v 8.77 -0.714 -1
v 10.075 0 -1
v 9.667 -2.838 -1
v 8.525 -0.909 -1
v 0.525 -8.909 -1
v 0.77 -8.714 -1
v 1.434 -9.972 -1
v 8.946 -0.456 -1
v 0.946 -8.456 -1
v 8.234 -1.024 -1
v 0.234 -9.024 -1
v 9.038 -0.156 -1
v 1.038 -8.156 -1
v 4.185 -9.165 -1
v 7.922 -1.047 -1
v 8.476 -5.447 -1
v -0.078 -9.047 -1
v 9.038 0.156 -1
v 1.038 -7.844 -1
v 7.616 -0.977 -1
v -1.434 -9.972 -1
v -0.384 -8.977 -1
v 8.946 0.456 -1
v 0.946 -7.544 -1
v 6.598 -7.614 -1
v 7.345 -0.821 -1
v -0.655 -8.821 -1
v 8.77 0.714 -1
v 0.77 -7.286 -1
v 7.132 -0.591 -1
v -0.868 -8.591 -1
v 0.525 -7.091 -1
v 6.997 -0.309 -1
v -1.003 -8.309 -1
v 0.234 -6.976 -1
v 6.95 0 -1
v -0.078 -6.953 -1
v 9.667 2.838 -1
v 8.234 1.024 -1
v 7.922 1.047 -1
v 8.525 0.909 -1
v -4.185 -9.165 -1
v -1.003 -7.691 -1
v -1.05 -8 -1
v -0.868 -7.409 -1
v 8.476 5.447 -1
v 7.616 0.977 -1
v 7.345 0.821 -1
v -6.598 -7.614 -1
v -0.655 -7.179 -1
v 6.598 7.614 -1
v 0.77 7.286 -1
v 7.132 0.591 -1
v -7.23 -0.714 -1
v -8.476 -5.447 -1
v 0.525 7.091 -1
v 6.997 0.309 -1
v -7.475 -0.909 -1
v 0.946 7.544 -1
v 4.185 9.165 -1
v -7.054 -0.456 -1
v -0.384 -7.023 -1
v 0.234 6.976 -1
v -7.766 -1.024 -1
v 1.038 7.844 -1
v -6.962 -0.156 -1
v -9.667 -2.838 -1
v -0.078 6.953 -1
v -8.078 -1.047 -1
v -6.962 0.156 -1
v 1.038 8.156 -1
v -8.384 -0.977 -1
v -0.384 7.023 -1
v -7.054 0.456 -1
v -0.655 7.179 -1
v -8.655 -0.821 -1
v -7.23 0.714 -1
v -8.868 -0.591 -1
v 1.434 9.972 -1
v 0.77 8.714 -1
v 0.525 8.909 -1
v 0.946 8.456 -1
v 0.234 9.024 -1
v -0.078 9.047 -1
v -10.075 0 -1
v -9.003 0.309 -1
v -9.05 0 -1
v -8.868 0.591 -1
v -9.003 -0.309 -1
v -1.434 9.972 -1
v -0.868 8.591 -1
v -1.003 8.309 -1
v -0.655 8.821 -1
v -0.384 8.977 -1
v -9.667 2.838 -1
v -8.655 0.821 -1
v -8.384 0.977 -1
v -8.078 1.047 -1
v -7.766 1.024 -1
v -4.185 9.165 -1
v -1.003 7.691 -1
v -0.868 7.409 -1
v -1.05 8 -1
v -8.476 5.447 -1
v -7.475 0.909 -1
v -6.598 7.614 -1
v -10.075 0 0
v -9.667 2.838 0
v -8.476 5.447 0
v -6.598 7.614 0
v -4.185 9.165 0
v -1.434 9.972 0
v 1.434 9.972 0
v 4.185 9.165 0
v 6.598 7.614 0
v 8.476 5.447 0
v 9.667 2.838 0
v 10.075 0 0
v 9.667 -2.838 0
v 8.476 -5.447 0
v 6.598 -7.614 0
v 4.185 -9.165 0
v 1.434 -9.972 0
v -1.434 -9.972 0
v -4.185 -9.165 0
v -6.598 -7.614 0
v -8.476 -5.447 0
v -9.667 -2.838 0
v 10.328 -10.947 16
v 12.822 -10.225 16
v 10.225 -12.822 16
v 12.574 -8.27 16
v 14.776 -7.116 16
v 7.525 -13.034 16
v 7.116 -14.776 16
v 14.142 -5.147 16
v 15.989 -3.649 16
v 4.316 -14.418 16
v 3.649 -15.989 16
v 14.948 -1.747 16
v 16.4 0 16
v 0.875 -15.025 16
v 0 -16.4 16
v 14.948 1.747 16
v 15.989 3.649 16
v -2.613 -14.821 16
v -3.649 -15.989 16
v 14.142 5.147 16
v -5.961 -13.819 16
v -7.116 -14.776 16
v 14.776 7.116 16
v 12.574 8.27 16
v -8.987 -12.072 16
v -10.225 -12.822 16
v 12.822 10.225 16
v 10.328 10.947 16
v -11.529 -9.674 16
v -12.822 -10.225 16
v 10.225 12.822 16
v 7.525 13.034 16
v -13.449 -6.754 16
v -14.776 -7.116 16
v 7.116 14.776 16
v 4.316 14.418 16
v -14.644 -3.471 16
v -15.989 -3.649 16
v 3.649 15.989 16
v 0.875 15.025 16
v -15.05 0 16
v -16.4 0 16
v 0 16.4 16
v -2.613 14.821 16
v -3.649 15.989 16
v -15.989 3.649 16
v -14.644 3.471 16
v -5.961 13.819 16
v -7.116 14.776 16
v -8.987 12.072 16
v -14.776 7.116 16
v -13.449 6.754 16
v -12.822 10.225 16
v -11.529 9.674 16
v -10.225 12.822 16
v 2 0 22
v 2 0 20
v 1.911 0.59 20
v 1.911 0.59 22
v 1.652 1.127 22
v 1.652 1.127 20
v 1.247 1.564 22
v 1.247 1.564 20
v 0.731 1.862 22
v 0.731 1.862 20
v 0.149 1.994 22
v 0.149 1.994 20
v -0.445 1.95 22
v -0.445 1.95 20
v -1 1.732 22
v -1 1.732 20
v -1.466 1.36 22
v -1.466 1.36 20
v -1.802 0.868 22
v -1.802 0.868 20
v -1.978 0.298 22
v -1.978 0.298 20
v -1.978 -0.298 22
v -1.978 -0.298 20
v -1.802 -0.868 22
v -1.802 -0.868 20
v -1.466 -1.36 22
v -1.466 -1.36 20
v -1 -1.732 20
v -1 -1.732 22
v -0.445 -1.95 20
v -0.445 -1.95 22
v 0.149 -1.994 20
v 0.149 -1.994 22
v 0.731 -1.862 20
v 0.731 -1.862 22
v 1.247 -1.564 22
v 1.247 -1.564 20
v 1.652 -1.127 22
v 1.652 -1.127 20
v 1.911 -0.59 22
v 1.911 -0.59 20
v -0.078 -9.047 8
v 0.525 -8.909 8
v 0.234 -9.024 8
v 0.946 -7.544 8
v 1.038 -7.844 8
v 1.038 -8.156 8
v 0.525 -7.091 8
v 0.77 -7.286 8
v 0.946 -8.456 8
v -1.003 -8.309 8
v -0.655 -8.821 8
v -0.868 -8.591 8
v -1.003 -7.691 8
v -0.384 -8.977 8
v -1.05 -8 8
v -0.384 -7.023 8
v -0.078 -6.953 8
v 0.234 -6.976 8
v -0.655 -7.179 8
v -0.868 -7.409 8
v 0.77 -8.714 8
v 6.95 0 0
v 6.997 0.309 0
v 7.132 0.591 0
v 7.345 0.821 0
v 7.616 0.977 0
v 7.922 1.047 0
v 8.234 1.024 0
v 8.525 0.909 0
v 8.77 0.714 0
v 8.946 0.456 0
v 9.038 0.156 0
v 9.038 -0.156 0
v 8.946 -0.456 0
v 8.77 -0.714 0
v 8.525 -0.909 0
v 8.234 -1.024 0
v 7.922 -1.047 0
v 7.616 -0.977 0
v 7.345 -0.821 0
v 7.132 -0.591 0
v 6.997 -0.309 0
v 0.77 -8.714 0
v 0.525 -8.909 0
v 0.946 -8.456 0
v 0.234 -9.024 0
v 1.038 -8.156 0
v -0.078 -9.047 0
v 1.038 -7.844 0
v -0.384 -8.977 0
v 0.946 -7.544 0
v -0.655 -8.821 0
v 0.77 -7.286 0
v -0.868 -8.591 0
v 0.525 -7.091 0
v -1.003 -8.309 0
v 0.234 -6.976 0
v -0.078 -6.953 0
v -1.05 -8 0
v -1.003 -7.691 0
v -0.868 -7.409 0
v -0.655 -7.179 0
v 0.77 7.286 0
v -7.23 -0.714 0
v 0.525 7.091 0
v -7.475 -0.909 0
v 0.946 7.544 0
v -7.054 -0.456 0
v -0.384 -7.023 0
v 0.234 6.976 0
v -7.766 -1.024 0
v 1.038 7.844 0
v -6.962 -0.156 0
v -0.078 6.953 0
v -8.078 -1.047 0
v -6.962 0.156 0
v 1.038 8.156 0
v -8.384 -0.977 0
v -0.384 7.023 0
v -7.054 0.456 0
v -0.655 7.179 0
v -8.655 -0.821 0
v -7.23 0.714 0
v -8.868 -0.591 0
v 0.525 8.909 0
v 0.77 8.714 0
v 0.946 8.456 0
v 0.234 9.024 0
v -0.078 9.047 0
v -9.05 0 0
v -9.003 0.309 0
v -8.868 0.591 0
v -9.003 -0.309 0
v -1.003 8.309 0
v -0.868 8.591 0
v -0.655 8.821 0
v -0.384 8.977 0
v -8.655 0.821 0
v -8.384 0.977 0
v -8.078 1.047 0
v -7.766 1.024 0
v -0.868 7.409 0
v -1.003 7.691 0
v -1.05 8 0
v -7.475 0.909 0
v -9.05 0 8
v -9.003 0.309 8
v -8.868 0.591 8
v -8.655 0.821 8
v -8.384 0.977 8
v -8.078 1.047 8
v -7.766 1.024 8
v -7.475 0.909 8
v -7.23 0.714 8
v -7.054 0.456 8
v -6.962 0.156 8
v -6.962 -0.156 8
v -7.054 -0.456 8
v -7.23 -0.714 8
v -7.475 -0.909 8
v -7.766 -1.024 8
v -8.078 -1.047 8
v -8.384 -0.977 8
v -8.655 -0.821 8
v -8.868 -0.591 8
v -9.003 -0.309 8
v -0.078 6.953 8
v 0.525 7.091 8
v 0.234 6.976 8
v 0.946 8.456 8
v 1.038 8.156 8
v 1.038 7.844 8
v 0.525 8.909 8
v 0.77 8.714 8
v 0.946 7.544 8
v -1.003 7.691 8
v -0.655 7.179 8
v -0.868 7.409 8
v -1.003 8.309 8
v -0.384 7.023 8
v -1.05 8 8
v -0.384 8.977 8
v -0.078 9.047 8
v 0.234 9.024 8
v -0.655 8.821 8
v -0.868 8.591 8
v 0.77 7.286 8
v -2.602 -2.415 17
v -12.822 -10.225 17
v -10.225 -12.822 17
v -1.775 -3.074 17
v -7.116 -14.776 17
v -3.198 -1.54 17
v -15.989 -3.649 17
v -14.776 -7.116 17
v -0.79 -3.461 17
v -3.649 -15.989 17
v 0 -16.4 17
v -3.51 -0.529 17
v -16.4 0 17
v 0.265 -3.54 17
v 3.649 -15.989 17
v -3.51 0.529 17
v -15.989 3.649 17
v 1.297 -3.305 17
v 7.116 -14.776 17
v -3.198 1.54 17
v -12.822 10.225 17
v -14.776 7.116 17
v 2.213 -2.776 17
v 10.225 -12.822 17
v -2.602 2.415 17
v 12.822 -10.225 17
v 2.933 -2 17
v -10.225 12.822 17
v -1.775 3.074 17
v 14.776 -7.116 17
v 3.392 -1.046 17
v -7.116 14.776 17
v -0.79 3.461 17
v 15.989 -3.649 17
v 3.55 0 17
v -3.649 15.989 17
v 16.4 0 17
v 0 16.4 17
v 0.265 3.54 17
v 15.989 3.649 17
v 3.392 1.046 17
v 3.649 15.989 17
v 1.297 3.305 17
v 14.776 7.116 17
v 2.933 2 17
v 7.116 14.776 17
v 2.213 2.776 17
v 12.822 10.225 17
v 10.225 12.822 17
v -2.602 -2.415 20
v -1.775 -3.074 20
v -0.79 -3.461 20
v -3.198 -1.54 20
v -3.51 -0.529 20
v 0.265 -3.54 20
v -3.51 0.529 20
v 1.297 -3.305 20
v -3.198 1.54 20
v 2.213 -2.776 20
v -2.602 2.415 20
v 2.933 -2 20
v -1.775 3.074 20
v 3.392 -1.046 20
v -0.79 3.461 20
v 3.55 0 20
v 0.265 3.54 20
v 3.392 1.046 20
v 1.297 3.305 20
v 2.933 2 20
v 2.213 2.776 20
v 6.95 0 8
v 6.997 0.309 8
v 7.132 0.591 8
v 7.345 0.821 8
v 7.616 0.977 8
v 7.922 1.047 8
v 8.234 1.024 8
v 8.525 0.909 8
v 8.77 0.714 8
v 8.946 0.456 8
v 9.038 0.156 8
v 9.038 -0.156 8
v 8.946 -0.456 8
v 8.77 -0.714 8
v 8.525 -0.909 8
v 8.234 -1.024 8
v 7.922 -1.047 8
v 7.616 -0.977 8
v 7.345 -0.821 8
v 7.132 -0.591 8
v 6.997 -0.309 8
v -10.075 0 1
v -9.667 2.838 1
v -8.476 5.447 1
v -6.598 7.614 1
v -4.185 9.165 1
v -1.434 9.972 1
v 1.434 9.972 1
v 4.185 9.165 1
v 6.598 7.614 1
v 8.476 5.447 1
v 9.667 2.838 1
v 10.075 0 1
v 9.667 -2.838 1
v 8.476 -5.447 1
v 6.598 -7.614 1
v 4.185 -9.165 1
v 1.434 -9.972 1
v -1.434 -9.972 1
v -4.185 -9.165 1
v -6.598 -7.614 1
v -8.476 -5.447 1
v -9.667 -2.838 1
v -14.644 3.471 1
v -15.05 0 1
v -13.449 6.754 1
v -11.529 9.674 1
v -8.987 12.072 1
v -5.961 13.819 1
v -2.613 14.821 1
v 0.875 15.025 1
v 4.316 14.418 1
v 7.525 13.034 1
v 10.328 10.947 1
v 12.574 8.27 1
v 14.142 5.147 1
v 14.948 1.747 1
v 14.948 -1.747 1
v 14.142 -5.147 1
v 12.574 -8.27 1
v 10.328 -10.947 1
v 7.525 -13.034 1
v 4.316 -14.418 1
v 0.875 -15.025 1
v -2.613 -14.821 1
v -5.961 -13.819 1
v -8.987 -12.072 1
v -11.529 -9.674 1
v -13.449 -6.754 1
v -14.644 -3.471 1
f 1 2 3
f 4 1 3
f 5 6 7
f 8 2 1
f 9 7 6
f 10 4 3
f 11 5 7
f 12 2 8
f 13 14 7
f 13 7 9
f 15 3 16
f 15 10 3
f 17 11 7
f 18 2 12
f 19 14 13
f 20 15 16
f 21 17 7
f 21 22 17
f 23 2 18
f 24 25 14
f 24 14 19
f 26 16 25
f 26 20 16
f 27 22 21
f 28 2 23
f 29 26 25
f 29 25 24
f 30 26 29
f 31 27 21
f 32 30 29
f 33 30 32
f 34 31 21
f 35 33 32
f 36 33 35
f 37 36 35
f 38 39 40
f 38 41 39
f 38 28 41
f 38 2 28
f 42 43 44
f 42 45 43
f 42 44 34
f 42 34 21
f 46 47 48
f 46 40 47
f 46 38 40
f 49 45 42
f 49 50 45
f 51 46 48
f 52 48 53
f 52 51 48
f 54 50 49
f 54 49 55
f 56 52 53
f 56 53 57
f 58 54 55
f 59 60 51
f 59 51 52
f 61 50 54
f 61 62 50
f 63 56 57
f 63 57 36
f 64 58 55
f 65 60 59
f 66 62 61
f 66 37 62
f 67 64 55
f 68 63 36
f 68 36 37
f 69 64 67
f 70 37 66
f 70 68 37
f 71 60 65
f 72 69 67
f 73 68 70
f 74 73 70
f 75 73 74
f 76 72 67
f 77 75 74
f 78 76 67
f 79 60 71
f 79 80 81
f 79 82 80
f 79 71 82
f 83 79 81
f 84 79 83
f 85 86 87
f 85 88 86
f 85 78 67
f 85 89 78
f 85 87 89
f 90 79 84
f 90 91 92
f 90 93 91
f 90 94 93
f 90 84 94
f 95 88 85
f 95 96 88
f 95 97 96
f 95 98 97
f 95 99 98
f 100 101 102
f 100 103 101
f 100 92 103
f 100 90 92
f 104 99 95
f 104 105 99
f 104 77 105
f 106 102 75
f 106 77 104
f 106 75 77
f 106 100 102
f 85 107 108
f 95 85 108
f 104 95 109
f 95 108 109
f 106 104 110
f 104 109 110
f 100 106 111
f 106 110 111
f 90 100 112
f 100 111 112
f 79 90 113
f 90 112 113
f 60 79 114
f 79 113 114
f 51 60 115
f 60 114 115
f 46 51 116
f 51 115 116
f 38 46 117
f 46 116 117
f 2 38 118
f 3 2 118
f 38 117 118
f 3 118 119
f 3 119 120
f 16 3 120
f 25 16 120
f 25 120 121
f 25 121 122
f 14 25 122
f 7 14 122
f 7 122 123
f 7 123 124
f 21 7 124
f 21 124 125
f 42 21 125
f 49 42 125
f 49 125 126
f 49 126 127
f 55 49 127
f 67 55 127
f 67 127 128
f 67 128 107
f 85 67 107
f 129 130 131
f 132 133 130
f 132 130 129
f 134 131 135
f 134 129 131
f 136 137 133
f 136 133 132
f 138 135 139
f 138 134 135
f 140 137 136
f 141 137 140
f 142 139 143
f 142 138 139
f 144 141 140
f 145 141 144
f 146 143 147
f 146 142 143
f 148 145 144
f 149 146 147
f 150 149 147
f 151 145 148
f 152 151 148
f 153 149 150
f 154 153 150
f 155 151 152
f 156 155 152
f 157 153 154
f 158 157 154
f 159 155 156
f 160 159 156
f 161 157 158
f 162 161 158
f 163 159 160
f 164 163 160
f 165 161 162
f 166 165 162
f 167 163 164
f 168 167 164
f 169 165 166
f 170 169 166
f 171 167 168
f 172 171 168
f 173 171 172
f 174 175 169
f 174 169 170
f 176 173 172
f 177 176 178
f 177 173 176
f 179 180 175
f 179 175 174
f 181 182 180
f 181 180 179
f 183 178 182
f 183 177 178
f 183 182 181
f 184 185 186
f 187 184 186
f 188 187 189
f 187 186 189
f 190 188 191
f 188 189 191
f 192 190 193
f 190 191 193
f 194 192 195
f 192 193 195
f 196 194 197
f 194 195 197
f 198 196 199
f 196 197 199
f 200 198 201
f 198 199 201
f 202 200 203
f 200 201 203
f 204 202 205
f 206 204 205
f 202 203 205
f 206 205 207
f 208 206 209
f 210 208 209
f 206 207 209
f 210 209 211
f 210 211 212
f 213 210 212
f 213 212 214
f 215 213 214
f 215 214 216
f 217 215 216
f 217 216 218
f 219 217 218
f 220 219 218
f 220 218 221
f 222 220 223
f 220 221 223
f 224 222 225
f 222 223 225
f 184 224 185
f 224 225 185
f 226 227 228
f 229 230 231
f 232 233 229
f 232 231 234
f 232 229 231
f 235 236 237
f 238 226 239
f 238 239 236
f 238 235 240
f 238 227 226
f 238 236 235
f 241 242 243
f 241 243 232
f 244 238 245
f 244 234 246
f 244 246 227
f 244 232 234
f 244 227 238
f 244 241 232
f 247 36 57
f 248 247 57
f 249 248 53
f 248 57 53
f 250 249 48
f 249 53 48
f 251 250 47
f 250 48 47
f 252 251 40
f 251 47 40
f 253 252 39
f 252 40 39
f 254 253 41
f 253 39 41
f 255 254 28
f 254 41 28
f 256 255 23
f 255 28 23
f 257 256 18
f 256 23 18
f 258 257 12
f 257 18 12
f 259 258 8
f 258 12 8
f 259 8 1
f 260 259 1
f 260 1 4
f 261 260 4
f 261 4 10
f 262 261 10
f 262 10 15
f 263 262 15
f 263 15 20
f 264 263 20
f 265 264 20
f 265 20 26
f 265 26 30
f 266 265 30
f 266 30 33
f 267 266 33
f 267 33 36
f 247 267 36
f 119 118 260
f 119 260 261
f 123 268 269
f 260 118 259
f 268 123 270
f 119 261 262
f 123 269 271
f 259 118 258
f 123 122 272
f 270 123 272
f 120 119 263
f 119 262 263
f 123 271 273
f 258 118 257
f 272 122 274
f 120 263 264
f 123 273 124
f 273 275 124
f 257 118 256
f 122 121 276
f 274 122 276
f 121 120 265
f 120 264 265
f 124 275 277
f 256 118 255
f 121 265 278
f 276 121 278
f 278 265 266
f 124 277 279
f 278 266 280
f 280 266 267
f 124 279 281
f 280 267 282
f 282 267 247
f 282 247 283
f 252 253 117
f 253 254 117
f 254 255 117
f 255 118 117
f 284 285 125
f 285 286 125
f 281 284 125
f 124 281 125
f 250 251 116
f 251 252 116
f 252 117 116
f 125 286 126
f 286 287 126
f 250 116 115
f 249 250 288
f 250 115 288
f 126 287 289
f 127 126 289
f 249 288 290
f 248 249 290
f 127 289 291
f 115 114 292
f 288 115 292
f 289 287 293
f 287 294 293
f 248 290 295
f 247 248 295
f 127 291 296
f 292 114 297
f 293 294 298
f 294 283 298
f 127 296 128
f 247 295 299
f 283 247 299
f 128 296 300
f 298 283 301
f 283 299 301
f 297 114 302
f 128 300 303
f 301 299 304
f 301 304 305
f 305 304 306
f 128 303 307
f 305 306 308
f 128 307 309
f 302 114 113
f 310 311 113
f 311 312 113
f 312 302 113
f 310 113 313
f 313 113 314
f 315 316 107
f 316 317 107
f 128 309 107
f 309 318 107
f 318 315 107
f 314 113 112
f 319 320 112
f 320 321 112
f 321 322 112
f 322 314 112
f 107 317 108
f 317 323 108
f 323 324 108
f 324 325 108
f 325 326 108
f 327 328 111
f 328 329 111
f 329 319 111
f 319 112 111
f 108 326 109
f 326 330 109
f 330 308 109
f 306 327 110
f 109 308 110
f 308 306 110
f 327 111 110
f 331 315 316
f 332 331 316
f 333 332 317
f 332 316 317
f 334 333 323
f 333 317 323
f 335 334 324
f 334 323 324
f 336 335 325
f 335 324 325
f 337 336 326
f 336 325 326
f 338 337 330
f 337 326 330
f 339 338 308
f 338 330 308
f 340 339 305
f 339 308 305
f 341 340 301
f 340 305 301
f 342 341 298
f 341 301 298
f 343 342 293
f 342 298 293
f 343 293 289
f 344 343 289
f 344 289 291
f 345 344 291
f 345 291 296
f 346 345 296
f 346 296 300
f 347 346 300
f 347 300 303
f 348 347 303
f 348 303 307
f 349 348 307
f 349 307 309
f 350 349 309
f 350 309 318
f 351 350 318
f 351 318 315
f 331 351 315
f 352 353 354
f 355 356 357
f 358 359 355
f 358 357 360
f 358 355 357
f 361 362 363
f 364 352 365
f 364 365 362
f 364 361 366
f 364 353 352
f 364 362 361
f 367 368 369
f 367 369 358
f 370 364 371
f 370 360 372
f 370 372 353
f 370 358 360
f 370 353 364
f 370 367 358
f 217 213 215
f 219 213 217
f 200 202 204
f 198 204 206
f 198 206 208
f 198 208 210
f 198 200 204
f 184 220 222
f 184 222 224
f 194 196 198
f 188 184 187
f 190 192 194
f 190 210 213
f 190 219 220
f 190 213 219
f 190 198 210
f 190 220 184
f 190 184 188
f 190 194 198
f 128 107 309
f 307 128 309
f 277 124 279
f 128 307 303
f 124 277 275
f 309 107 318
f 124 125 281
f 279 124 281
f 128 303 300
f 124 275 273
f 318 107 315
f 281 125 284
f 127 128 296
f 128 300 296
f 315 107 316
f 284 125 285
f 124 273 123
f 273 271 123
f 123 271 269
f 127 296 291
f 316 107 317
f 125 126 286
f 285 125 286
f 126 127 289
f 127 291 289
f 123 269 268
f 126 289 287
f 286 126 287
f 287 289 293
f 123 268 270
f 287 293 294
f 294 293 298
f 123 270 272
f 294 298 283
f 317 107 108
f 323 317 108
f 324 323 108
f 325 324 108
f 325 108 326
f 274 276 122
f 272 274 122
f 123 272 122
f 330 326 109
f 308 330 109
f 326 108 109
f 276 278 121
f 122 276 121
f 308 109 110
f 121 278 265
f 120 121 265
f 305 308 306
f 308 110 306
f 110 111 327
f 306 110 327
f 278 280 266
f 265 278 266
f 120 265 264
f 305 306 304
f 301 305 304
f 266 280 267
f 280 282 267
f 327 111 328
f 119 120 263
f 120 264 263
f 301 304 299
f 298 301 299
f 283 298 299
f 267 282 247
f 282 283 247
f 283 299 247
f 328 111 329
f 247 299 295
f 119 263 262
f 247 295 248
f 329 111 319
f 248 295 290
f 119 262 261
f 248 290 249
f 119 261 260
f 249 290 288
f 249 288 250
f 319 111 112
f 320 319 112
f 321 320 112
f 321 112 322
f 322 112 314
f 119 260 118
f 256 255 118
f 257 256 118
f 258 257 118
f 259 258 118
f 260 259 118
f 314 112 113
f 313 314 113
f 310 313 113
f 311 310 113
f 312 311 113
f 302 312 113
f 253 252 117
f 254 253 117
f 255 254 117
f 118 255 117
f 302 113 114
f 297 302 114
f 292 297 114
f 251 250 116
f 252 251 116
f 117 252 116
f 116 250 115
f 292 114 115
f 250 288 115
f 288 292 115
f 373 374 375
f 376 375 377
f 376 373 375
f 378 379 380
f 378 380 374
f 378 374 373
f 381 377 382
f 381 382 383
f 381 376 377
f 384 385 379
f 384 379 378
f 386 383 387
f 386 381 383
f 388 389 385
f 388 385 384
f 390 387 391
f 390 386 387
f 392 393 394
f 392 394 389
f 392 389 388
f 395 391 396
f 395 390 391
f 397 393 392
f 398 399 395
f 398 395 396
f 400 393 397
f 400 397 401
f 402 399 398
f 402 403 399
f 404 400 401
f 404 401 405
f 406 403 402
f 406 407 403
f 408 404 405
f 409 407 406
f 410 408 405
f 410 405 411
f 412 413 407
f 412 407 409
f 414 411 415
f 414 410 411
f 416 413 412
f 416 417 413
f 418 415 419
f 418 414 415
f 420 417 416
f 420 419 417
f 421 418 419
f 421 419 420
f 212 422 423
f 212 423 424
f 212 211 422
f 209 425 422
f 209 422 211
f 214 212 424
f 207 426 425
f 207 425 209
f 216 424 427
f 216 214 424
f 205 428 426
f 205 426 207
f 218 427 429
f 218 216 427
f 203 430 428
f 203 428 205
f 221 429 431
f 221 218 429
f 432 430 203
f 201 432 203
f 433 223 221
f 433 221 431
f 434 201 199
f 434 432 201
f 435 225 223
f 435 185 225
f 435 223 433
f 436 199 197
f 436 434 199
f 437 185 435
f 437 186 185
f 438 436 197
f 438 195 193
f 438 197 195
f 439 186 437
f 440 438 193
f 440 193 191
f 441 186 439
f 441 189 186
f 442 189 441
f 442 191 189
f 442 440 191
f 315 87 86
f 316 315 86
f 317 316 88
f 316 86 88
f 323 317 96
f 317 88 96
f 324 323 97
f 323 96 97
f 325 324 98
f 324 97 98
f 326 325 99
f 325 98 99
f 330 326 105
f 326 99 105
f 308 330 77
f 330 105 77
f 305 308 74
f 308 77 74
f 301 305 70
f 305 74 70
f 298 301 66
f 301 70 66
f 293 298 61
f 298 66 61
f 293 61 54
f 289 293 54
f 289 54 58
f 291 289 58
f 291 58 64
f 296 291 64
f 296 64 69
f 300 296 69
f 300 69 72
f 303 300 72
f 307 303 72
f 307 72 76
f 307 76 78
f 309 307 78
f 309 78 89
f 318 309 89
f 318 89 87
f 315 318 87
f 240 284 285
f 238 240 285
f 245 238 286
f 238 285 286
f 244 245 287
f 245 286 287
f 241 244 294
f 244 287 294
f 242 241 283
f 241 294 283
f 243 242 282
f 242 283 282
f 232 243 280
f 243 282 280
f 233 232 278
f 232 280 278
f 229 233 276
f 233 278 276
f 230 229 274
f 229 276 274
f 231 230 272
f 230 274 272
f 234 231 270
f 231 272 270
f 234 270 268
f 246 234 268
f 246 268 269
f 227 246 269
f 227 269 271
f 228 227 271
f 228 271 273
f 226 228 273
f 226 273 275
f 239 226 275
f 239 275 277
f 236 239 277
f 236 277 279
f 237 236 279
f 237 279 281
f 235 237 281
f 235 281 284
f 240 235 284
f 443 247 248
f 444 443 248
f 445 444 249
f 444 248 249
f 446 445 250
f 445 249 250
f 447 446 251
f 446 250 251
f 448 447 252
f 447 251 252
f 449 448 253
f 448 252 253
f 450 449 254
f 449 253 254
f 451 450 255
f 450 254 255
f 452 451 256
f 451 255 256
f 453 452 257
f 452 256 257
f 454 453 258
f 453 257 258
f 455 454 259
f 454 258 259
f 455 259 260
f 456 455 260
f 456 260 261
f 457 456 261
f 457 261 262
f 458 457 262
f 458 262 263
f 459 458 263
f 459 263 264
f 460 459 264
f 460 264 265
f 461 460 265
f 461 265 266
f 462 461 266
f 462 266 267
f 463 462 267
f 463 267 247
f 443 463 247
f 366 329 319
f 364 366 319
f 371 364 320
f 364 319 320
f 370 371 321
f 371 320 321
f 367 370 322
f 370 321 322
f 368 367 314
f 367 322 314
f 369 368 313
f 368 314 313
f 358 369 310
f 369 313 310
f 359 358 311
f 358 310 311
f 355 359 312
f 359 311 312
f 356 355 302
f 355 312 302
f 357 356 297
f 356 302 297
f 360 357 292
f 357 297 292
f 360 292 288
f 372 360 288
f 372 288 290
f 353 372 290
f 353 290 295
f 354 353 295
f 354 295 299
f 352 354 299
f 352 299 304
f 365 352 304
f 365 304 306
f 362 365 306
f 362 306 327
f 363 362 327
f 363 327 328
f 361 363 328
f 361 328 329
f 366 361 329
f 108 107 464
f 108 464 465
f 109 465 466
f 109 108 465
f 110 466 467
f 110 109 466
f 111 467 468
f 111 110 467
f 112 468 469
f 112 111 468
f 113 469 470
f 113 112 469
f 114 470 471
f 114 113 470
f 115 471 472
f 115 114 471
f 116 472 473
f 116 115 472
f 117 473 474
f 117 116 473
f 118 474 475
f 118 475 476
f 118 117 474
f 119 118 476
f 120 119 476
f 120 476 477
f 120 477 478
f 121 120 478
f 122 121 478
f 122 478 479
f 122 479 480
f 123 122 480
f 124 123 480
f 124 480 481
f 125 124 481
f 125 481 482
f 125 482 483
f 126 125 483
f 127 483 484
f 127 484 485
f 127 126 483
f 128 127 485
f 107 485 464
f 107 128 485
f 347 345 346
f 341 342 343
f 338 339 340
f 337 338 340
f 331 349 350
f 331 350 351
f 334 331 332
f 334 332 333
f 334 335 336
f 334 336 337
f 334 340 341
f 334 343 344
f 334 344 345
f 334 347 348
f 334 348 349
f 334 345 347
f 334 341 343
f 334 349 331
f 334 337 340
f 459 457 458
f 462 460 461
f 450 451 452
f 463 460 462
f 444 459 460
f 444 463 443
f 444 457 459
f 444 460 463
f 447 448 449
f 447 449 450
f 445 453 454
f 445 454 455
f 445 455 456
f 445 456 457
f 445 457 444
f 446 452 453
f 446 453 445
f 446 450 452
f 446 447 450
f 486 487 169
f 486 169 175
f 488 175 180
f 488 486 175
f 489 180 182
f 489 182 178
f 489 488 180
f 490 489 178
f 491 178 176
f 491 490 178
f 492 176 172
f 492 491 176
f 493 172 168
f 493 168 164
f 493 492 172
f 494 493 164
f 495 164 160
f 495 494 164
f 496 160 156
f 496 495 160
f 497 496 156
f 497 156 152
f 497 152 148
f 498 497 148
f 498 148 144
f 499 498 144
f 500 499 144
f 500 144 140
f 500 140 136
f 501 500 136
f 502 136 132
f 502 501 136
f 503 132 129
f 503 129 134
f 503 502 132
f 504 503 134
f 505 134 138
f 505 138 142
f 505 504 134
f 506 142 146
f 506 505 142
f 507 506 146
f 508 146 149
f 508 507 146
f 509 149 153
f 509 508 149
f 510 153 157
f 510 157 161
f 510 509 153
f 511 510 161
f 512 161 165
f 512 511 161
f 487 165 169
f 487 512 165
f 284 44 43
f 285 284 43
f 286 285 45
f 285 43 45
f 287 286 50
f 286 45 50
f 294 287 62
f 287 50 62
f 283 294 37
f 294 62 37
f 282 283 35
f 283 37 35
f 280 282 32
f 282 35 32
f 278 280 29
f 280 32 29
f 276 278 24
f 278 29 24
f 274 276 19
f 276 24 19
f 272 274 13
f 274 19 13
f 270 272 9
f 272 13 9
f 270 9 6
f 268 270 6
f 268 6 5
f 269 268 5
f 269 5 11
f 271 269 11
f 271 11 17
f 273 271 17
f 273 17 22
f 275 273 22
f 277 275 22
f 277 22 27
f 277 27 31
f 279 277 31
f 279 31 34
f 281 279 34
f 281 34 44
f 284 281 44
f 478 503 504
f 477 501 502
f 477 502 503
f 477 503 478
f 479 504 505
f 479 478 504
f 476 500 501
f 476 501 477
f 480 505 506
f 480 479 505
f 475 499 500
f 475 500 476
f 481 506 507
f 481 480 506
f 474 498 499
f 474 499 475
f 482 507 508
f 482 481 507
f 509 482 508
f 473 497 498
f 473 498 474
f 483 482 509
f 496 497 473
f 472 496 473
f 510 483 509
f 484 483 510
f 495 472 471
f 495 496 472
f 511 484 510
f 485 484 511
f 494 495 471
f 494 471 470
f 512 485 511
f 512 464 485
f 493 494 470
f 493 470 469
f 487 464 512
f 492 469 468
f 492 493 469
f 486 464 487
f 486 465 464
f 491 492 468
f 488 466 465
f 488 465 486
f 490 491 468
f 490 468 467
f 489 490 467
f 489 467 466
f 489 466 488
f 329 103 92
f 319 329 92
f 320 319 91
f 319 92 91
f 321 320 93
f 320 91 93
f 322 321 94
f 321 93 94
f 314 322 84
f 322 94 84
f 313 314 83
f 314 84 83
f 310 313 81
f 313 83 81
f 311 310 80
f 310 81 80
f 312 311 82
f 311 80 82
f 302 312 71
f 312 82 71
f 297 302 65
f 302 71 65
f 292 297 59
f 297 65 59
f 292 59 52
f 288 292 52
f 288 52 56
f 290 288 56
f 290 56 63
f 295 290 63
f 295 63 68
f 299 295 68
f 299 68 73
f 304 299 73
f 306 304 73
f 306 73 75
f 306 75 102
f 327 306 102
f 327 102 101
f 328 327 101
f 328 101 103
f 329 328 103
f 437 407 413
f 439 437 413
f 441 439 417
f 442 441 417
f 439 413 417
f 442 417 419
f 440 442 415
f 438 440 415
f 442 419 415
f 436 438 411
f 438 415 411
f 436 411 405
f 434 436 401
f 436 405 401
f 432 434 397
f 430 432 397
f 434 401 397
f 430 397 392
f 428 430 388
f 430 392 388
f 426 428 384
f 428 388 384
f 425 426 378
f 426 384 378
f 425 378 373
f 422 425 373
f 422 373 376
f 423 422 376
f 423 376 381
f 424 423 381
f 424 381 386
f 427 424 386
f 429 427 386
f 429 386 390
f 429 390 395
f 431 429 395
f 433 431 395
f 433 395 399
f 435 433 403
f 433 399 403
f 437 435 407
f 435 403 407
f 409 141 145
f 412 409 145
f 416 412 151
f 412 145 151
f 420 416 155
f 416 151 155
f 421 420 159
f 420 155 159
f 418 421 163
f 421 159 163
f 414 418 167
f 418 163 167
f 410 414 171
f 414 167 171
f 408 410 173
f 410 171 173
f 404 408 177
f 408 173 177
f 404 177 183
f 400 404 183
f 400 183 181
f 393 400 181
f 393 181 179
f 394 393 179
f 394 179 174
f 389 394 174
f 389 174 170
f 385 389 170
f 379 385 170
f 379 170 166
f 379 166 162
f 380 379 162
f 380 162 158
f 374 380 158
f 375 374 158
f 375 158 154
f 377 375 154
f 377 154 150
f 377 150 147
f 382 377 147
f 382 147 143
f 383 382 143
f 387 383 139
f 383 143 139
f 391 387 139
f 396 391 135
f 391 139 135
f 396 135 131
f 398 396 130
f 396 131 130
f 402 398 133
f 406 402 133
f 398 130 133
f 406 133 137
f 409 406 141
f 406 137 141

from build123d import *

# Parameters (mm, degrees)
SKETCH_1_R          = 16.4
EXTRUDE_1_DEPTH     = 17
SKETCH_2_R          = 3.55
EXTRUDE_2_DEPTH     = 3
SKETCH_3_R          = 10.075
EXTRUDE_3_DEPTH     = 2
SKETCH_7_R          = 1.05
CUT_EXTRUDE_3_DEPTH = 10
SKETCH3_R           = 16.4
SKETCH3_R_2         = 15.075
CUT_EXTRUDE1_DEPTH  = 16
SKETCH4_R           = 15.075
SKETCH4_R_2         = 10.075
CUT_EXTRUDE2_DEPTH  = 1
SKETCH5_R           = 10.075
CUT_EXTRUDE3_DEPTH  = 1
SKETCH6_R           = 2
BOSS_EXTRUDE1_DEPTH = 2
SKETCH7_R           = 15.075
SKETCH7_R_2         = 15.05
CUT_EXTRUDE4_DEPTH  = 15


with BuildPart() as part:
    # 草图1 → 凸台-拉伸1 (new body)
    with BuildSketch(Plane.XY):
        Circle(SKETCH_1_R)
    extrude(amount=EXTRUDE_1_DEPTH)

    # 草图2 → 凸台-拉伸2 (add)
    with BuildSketch(Plane.XY.offset(17)):
        Circle(SKETCH_2_R)
    extrude(amount=EXTRUDE_2_DEPTH)


with BuildPart() as body_2:
    # 草图3 → 凸台-拉伸3 (new body)
    with BuildSketch(Plane(origin=(0, 0, 0), x_dir=(-1, 0, 0), z_dir=(0, 0, -1))):
        Circle(SKETCH_3_R)
    extrude(amount=EXTRUDE_3_DEPTH)


with BuildPart() as cut_extrude_3_tool:
    # 草图7 → 切除-拉伸3 (new body)
    with BuildSketch(Plane(origin=(0, 0, -2), x_dir=(-1, 0, 0), z_dir=(0, 0, -1))):
        with Locations((0, 8)):
            Circle(SKETCH_7_R)
        with Locations((8, 0)):
            Circle(SKETCH_7_R)
        with Locations((0, -8)):
            Circle(SKETCH_7_R)
        with Locations((-8, 0)):
            Circle(SKETCH_7_R)
    extrude(amount=-CUT_EXTRUDE_3_DEPTH)


with BuildPart() as part_1:
    add(part.part)

    # 切除-拉伸3: cut by cut_extrude_3_tool
    add(cut_extrude_3_tool.part, mode=Mode.SUBTRACT)

    # Sketch3 → Cut-Extrude1 (cut)
    with BuildSketch(Plane(origin=(0, 0, 0), x_dir=(-1, 0, 0), z_dir=(0, 0, -1))):
        Circle(SKETCH3_R)
        Circle(SKETCH3_R_2, mode=Mode.SUBTRACT)
    extrude(amount=-CUT_EXTRUDE1_DEPTH, mode=Mode.SUBTRACT)

    # Sketch4 → Cut-Extrude2 (cut)
    with BuildSketch(Plane(origin=(0, 0, 0), x_dir=(-1, 0, 0), z_dir=(0, 0, -1))):
        Circle(SKETCH4_R)
        Circle(SKETCH4_R_2, mode=Mode.SUBTRACT)
    extrude(amount=-CUT_EXTRUDE2_DEPTH, mode=Mode.SUBTRACT)

    # Sketch6 → Boss-Extrude1 (add)
    with BuildSketch(Plane.XY.offset(20)):
        Circle(SKETCH6_R)
    extrude(amount=BOSS_EXTRUDE1_DEPTH)

    # Sketch7 → Cut-Extrude4 (cut)
    with BuildSketch(Plane(origin=(0, 0, 1), x_dir=(-1, 0, 0), z_dir=(0, 0, -1))):
        Circle(SKETCH7_R)
        Circle(SKETCH7_R_2, mode=Mode.SUBTRACT)
    extrude(amount=-CUT_EXTRUDE4_DEPTH, mode=Mode.SUBTRACT)


with BuildPart() as body_2_1:
    add(body_2.part)

    # 切除-拉伸3: cut by cut_extrude_3_tool
    add(cut_extrude_3_tool.part, mode=Mode.SUBTRACT)

    # Sketch5 → Cut-Extrude3 (cut)
    with BuildSketch(Plane(origin=(0, 0, -2), x_dir=(-1, 0, 0), z_dir=(0, 0, -1))):
        Circle(SKETCH5_R)
    extrude(amount=-CUT_EXTRUDE3_DEPTH, mode=Mode.SUBTRACT)


solid = Compound([part_1.part, body_2_1.part])
